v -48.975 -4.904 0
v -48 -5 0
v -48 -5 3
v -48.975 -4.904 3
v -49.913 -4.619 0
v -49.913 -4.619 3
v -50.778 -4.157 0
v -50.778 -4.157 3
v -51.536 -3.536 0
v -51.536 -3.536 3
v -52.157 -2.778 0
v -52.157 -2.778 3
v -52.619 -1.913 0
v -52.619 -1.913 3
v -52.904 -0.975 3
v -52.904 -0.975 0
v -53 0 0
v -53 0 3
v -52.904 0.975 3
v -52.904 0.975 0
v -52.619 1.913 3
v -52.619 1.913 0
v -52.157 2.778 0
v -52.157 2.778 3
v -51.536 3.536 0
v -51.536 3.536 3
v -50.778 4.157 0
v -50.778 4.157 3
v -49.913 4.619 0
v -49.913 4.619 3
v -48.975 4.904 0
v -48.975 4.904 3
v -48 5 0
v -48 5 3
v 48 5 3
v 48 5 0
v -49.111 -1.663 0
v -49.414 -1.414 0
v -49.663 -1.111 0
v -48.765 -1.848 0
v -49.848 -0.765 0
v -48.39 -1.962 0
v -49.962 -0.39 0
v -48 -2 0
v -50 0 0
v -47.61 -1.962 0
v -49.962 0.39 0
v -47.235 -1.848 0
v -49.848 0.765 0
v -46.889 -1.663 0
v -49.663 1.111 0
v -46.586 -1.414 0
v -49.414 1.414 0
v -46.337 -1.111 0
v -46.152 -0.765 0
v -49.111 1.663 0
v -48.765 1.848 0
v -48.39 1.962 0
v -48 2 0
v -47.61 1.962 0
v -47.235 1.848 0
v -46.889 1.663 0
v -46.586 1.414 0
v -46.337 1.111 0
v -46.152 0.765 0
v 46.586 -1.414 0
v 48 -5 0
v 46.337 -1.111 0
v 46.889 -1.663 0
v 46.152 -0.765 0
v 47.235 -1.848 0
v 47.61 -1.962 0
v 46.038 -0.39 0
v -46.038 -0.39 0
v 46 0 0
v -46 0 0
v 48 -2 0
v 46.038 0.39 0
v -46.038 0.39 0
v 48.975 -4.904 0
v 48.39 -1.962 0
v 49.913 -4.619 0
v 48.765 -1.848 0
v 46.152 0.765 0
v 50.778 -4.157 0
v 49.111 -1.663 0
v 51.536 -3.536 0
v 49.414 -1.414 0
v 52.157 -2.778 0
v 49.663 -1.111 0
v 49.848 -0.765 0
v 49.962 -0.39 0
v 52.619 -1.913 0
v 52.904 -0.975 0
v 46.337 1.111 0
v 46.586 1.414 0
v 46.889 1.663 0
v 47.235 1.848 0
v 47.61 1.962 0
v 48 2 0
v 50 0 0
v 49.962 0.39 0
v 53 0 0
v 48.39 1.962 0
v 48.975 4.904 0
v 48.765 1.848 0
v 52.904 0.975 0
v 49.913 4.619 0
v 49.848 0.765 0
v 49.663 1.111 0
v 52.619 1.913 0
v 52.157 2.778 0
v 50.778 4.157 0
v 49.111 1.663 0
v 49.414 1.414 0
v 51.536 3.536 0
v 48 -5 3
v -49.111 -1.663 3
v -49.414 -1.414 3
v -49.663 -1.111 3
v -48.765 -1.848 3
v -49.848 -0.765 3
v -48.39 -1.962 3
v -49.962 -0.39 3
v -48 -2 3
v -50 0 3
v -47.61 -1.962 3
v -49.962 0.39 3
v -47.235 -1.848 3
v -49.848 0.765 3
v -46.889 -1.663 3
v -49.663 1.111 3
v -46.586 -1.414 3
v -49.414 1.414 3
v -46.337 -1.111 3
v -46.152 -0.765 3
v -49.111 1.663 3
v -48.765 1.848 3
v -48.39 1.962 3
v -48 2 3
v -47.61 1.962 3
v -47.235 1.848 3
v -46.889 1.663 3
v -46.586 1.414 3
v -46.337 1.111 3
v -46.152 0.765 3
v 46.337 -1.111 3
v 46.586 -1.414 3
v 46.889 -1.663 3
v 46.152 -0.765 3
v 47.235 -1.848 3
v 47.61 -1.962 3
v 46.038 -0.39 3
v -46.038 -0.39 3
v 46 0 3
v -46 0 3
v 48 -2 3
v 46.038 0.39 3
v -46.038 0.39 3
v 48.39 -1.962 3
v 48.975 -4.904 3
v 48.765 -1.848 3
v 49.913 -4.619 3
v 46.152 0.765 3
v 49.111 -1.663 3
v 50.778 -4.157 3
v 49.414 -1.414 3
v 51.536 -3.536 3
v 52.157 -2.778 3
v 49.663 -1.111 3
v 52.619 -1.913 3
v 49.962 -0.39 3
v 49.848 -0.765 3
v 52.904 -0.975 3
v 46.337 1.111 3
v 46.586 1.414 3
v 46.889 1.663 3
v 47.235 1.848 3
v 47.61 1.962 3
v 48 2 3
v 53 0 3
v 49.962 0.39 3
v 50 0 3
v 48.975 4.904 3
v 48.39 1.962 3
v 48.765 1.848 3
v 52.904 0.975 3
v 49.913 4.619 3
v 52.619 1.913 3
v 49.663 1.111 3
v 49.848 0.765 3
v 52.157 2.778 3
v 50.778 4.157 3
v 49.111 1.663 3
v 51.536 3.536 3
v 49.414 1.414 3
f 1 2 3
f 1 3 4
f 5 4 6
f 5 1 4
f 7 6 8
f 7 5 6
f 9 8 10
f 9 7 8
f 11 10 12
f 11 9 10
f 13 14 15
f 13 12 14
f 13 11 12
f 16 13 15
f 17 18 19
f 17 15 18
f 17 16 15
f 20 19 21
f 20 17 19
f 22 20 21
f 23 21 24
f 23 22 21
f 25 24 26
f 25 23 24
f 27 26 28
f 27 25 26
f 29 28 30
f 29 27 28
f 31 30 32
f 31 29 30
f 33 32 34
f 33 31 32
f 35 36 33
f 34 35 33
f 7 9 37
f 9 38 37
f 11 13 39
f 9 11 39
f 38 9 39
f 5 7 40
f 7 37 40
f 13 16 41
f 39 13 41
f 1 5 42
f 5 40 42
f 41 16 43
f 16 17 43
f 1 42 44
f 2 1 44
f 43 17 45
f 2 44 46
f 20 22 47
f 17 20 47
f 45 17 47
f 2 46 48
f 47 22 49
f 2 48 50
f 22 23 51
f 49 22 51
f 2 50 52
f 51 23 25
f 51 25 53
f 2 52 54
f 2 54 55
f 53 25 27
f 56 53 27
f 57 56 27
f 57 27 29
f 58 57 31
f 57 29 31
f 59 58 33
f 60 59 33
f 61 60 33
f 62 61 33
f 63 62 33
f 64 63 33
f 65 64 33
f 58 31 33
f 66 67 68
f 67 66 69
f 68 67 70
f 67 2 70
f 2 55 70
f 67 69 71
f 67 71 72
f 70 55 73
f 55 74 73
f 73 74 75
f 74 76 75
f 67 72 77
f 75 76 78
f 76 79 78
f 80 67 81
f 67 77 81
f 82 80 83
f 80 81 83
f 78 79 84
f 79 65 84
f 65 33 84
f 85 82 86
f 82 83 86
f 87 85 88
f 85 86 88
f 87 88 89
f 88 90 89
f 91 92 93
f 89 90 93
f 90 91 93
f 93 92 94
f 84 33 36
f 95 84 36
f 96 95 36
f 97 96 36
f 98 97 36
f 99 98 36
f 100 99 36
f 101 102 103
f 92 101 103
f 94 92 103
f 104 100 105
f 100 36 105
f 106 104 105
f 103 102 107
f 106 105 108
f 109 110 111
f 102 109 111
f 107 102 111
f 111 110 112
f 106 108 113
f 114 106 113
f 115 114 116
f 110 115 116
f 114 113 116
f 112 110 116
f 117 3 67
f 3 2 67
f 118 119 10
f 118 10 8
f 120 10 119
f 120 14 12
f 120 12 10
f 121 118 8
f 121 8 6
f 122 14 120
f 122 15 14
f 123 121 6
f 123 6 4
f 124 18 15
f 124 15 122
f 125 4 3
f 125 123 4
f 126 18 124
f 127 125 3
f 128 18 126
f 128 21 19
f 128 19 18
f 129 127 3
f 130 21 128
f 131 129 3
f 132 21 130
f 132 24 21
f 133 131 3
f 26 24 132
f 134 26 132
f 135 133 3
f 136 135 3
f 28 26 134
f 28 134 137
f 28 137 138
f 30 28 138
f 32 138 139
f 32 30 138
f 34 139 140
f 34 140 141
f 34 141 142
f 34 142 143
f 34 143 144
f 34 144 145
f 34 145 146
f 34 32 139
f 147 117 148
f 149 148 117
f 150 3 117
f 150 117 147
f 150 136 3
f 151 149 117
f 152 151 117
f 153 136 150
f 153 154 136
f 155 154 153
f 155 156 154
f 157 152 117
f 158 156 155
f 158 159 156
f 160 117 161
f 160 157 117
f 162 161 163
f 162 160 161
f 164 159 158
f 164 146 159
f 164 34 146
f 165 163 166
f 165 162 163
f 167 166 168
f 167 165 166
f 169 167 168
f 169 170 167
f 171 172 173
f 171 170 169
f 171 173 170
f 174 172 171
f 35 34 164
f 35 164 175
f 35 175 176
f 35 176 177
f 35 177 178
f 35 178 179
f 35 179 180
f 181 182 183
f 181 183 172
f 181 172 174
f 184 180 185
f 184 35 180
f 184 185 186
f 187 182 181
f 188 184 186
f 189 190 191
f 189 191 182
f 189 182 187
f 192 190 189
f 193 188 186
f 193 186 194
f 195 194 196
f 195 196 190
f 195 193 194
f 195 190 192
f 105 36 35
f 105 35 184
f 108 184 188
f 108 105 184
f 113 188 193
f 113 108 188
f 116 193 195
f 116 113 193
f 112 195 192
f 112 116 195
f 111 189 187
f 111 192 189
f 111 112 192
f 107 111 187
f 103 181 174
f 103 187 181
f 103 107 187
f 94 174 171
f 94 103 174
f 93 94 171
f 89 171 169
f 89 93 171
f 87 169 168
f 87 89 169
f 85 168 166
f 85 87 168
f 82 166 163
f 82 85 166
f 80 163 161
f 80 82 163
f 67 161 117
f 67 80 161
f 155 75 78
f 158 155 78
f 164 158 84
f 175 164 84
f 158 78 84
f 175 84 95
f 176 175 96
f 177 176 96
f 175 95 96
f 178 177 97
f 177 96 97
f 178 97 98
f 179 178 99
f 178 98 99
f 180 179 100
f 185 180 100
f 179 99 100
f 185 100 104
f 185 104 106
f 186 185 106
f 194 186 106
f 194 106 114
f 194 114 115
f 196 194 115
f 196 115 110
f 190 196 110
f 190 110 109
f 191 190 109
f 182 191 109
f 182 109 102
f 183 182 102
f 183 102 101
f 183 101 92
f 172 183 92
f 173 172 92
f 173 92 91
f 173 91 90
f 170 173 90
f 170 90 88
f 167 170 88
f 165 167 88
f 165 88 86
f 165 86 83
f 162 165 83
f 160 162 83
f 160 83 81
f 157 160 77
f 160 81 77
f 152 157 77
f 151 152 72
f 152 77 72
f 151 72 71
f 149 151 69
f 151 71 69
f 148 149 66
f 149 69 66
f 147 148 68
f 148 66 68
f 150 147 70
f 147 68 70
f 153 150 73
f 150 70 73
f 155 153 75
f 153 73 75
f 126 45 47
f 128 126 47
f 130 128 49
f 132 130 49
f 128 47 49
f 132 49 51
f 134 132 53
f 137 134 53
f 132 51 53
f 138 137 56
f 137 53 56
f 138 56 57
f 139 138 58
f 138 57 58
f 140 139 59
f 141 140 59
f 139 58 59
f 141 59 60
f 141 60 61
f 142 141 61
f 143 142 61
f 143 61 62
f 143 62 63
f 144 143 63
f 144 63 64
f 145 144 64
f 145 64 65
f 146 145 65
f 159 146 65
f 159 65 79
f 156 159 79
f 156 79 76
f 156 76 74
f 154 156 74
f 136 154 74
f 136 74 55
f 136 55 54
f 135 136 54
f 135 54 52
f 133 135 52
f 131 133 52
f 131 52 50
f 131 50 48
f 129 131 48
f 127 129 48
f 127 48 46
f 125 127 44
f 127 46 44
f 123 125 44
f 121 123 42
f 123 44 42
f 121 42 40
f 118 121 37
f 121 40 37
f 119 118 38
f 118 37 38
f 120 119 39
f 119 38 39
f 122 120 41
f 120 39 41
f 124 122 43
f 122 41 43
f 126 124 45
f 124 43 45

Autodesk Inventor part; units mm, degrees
ref_plane "YZ Plane" through (0, 0, 0) normal (1, 0, 0) x (0, 1, 0)
ref_plane "XZ Plane" through (0, 0, 0) normal (0, 1, 0) x (-1, 0, 0)
ref_plane "XY Plane" through (0, 0, 0) normal (0, 0, 1) x (1, 0, 0)
sketch "草图1" plane through (0, 0, 0) normal (0, 0, 1) x (1, 0, 0)
  line L0 (-48, 0) -> (48, 0) construction
  line L1 (-48, -5) -> (48, -5)
  line L2 (48, 5) -> (-48, 5)
  arc A0 (-48, 5) -> (-48, -5) centre (-48, 0) ccw
  arc A1 (48, -5) -> (48, 5) centre (48, 0) ccw
  point P0 (0, 0)
  dimension "d1" = 96
  dimension "d4" = 10
extrude "拉伸1" add sketch "草图1" along normal blind 3
sketch "草图2" plane through (0, 0, 0) normal (0, 0, -1) x (-1, 0, 0)
  arc A0 (48, -5) -> (48, 5) centre (48, 0) ccw projected
  circle A1 centre (48, 0) radius 2
  line L0 (0, 0) -> (0, -18.0747)
  arc A2 (-48, 5) -> (-48, -5) centre (-48, 0) ccw
  circle A3 centre (-48, 0) radius 2
  dimension "d5" = 4
extrude "拉伸2" cut sketch "草图2" against normal blind 10
properties part number "连杆1"
